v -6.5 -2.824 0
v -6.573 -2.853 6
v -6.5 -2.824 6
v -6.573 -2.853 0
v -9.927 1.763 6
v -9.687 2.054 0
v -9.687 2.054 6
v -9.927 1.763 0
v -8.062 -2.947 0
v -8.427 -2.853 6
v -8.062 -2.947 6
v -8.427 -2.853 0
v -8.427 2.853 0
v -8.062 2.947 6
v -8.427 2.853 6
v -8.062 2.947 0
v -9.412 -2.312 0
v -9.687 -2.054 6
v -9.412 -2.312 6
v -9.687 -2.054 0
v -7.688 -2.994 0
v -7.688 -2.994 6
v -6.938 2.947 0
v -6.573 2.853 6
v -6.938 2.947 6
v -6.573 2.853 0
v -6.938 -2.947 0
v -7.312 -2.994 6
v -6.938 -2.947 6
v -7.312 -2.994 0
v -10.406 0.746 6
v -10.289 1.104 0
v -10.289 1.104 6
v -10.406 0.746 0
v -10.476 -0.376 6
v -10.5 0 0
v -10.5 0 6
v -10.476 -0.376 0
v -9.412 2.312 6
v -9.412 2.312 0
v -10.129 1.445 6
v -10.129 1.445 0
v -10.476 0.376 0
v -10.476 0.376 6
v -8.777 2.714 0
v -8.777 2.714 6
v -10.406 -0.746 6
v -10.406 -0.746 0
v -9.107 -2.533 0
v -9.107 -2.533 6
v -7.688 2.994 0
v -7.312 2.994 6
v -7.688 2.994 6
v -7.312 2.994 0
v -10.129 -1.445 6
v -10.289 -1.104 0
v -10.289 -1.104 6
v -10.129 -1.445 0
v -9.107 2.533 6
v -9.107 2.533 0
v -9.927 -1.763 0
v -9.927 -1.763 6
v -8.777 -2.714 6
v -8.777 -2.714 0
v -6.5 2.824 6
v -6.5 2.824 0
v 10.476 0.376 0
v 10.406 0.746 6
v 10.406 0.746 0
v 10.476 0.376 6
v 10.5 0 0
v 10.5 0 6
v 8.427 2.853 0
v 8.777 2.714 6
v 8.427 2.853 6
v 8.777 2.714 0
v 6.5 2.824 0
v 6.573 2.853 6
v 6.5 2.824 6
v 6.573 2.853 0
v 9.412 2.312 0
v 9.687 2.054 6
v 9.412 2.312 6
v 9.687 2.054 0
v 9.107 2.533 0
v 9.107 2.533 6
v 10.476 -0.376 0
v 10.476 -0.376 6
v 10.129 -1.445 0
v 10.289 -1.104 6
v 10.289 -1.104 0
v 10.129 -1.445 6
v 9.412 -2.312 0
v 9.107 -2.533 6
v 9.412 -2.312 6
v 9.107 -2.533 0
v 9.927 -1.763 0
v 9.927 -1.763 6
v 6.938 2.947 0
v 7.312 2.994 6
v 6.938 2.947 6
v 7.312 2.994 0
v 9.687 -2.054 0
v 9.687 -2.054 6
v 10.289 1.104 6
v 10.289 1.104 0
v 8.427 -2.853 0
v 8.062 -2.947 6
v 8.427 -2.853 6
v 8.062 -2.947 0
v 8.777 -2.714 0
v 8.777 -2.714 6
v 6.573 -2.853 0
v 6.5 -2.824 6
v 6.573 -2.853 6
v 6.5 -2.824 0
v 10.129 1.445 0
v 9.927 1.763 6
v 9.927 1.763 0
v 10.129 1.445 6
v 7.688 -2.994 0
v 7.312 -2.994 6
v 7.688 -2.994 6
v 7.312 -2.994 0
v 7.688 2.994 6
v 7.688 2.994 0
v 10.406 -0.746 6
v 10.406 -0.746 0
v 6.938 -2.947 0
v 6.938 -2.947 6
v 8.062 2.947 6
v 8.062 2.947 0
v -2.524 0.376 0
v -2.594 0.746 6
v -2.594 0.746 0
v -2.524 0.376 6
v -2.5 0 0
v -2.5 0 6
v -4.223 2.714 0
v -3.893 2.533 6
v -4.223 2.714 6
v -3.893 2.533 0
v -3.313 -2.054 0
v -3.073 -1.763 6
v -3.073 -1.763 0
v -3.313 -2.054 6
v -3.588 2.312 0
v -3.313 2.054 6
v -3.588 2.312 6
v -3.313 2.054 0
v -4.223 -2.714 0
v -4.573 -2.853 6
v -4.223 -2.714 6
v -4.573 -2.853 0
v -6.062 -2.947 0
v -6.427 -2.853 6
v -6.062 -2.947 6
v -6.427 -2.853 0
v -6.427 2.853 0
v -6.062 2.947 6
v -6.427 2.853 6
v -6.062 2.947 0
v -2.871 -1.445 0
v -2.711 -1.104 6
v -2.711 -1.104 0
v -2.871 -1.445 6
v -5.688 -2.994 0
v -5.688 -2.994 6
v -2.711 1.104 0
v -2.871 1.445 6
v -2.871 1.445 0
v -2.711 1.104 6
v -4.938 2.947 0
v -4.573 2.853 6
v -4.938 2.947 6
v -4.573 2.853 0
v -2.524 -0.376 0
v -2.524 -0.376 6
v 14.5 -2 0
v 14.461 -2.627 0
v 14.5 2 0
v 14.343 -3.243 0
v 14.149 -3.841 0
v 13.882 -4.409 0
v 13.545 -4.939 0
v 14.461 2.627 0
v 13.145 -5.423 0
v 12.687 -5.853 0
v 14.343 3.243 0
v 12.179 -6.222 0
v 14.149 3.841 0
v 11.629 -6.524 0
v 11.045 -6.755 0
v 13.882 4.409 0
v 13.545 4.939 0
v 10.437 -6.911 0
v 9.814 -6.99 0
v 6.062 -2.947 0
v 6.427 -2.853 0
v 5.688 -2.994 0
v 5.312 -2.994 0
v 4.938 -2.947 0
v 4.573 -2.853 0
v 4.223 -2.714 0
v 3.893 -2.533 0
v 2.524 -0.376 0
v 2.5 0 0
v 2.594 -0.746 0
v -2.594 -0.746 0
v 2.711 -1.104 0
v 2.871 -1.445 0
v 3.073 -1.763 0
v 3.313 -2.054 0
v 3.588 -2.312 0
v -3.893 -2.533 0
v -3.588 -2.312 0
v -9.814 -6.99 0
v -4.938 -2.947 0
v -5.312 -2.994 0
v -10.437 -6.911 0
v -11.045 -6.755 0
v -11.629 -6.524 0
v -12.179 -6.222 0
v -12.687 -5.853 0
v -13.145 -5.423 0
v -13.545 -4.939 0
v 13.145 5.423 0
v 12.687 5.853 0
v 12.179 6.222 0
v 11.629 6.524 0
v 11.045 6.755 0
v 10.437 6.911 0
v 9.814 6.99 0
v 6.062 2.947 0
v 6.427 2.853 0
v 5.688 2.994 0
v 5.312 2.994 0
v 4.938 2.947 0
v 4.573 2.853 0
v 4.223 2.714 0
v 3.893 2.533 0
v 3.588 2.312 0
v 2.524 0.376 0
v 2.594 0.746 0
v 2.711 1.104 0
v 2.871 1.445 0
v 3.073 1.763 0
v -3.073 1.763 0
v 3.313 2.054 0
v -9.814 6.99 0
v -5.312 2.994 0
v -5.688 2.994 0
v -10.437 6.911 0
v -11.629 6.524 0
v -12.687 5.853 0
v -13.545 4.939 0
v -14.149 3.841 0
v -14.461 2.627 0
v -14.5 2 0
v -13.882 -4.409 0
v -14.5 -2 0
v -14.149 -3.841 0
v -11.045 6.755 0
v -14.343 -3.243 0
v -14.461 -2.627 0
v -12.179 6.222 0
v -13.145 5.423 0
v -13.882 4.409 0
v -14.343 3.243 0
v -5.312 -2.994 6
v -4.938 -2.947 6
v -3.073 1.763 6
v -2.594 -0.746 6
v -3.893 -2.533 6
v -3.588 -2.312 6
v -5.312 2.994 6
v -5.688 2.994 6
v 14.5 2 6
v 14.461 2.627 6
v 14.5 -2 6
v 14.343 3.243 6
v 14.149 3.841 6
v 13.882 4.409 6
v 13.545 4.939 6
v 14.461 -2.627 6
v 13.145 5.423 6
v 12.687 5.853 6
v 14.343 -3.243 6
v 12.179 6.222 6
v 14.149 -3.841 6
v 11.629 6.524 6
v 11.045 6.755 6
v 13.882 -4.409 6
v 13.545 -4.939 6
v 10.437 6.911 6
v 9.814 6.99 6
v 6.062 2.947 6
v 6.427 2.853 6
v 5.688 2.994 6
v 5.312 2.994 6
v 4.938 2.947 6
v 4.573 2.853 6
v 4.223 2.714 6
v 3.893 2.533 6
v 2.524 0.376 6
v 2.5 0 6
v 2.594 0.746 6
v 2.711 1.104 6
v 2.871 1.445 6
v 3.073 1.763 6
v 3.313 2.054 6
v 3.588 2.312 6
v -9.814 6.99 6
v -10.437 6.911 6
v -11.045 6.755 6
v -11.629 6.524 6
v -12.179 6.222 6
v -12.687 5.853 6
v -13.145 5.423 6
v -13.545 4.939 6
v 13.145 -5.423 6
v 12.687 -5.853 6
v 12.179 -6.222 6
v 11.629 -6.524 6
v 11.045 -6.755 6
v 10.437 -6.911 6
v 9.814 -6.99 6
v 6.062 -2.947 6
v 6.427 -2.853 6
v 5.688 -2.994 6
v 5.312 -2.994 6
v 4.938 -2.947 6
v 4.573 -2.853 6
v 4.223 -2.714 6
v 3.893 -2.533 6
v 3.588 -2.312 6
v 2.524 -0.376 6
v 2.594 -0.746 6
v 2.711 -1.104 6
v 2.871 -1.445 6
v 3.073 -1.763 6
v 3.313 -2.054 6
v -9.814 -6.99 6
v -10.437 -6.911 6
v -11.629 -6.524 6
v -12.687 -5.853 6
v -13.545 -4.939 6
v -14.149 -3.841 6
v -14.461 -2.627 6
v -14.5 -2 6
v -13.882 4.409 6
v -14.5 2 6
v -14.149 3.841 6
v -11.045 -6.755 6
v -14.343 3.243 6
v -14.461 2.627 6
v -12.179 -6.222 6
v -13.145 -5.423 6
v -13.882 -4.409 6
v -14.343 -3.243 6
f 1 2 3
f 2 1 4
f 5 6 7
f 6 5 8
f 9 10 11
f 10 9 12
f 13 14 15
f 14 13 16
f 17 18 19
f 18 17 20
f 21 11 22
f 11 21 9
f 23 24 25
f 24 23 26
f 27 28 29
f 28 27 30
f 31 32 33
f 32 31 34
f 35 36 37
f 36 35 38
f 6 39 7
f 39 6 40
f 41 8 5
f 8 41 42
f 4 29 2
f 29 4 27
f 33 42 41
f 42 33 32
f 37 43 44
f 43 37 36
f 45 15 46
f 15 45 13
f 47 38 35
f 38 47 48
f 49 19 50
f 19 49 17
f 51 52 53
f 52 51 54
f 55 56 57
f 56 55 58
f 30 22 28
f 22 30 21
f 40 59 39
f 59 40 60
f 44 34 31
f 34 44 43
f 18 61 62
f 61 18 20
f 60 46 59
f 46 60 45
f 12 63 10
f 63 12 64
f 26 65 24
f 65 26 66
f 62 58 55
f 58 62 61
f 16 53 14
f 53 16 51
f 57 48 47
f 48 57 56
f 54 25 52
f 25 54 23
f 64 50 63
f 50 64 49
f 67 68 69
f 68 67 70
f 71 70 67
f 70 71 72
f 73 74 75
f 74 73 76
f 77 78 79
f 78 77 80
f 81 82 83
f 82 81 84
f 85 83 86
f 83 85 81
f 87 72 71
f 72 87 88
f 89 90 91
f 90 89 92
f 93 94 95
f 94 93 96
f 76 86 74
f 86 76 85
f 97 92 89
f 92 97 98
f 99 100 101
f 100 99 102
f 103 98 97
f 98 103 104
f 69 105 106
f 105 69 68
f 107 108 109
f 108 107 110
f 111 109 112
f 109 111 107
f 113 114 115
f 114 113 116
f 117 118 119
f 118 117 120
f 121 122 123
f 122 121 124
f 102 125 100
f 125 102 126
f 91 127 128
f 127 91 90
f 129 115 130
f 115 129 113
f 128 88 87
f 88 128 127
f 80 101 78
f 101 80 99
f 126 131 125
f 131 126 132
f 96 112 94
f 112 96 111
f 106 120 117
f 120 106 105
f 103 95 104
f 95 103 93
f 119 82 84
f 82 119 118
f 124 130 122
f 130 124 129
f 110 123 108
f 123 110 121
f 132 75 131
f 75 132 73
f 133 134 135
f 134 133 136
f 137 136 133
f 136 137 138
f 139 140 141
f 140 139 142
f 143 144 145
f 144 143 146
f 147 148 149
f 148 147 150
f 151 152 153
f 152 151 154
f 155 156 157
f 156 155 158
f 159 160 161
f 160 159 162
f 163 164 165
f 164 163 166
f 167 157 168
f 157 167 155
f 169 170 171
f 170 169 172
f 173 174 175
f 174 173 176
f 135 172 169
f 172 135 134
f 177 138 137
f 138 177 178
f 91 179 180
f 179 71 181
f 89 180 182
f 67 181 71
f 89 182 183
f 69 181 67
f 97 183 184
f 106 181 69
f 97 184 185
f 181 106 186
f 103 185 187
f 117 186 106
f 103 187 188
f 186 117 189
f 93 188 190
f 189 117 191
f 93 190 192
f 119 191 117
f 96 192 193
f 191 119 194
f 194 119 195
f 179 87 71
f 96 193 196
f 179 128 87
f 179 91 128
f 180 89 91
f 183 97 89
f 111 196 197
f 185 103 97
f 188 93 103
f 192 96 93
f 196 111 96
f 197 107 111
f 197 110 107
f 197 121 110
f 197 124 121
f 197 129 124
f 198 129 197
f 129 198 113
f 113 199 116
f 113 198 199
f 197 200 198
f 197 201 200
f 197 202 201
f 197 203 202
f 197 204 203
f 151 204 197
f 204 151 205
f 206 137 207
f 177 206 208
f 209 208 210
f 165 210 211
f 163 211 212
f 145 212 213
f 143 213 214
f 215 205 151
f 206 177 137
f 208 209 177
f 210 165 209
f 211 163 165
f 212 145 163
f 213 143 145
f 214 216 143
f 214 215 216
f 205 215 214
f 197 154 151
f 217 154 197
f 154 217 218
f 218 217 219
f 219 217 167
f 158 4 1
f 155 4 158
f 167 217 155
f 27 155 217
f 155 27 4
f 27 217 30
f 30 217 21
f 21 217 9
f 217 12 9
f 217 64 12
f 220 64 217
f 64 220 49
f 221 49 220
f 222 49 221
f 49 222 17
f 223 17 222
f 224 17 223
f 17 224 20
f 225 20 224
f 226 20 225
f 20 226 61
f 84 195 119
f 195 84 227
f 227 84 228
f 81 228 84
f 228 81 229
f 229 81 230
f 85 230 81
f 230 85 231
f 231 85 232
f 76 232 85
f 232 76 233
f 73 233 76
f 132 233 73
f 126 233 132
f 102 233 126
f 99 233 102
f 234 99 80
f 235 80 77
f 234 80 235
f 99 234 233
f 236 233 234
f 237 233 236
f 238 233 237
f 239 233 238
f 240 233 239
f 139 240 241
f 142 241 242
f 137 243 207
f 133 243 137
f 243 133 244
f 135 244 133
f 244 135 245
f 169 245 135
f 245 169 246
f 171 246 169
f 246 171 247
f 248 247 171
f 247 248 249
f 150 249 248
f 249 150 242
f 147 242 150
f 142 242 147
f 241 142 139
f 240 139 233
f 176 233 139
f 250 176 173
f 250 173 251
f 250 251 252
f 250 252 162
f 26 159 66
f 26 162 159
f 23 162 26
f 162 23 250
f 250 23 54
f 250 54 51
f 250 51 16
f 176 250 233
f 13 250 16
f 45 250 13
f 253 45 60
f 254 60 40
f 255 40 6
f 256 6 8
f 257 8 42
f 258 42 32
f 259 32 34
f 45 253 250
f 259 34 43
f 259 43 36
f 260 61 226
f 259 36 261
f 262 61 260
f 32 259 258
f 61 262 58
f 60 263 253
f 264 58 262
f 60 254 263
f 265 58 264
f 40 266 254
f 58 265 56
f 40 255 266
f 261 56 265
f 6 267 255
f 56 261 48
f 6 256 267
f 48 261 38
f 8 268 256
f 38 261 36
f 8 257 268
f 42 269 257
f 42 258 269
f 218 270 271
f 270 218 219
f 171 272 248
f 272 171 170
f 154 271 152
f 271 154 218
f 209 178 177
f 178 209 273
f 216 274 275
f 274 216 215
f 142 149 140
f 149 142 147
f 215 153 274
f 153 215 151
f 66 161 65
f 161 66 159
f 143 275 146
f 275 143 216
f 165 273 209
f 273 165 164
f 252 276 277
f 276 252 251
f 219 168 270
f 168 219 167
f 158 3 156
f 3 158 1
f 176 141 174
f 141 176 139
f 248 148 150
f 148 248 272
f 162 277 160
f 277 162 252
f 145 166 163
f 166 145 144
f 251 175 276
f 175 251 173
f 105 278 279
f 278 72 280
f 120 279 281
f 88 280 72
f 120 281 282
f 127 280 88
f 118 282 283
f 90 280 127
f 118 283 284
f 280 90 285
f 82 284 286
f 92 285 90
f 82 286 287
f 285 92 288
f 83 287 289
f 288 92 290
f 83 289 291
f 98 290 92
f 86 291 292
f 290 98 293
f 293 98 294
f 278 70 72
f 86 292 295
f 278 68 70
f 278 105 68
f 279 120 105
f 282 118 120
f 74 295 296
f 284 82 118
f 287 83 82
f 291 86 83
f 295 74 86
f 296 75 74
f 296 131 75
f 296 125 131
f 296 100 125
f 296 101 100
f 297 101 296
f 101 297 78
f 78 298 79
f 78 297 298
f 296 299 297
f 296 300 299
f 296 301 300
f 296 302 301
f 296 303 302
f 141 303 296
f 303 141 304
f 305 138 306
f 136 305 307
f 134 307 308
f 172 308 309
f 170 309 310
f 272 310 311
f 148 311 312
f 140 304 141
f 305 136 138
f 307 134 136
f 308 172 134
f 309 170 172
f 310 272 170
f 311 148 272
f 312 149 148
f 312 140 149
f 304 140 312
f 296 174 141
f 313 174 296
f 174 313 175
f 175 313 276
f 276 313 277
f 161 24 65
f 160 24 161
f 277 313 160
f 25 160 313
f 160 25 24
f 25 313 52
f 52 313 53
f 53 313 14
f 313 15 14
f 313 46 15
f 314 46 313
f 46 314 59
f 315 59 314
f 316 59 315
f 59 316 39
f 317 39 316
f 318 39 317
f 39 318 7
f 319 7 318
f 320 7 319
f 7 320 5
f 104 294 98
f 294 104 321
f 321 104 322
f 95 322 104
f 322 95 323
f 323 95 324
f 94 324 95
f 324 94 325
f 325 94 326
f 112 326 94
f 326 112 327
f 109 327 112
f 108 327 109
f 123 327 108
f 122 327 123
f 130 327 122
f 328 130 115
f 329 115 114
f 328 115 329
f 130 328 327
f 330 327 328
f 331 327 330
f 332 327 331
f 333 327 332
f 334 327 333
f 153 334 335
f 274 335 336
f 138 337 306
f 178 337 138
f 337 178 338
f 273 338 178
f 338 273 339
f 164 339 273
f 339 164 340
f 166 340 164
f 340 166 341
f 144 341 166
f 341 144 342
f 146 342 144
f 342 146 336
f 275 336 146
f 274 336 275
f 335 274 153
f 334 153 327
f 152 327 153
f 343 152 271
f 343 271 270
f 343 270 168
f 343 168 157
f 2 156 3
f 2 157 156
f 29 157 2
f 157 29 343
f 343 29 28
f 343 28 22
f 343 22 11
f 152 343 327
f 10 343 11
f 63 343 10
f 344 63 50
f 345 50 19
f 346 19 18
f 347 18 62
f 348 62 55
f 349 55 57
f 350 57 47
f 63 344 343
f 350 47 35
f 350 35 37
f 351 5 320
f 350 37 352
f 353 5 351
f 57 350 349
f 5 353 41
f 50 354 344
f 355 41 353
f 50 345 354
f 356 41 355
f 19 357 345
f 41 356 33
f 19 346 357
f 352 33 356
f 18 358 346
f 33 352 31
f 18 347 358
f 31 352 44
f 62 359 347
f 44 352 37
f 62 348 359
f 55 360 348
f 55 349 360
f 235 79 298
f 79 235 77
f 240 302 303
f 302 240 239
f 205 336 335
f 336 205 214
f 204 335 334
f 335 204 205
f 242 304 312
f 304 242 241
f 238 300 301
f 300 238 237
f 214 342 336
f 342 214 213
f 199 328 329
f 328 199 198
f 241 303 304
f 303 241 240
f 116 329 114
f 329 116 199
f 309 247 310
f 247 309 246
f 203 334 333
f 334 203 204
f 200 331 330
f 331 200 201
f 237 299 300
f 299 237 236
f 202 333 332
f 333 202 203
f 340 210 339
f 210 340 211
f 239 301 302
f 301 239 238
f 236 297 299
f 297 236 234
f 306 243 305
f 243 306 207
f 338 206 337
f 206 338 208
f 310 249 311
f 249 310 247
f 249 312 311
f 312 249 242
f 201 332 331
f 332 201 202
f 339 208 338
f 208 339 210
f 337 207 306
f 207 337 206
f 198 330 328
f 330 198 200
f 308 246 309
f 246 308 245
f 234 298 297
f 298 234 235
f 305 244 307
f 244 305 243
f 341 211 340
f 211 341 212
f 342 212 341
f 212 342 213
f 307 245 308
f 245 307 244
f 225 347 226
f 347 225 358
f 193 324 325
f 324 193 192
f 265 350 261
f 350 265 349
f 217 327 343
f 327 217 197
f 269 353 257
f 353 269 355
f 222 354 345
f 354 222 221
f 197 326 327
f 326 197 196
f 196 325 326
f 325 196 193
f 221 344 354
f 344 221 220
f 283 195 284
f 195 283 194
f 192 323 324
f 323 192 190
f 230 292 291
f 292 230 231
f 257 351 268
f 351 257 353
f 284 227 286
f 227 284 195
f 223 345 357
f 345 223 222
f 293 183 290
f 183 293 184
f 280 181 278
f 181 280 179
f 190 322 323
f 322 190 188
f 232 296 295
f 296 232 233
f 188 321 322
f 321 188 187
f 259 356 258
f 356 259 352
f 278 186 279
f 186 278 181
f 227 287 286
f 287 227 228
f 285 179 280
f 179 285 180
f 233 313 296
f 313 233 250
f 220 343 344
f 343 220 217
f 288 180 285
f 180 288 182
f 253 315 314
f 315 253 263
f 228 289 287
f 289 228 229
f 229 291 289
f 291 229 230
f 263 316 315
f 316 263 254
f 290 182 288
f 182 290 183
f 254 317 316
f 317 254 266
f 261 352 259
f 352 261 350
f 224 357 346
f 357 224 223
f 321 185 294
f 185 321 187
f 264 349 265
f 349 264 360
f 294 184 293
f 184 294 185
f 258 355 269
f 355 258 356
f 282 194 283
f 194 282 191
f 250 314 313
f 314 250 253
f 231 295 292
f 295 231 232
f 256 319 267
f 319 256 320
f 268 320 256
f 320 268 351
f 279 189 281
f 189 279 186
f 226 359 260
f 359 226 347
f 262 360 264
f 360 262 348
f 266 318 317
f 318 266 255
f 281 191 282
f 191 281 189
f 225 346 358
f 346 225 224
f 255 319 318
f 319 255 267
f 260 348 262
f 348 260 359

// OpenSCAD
$fn = 50;


difference() {
	union() {
		hull() {
			translate(v = [-9.5000000000, 2.0000000000, 0]) {
				cylinder(h = 6, r = 5);
			}
			translate(v = [9.5000000000, 2.0000000000, 0]) {
				cylinder(h = 6, r = 5);
			}
			translate(v = [-9.5000000000, -2.0000000000, 0]) {
				cylinder(h = 6, r = 5);
			}
			translate(v = [9.5000000000, -2.0000000000, 0]) {
				cylinder(h = 6, r = 5);
			}
		}
	}
	union() {
		#translate(v = [-7.5000000000, 0.0000000000, -100.0000000000]) {
			cylinder(h = 200, r = 3.0000000000);
		}
		#translate(v = [-7.5000000000, 0.0000000000, -100.0000000000]) {
			cylinder(h = 200, r = 3.0000000000);
		}
		#translate(v = [7.5000000000, 0.0000000000, -100.0000000000]) {
			cylinder(h = 200, r = 3.0000000000);
		}
		#translate(v = [7.5000000000, 0.0000000000, -100.0000000000]) {
			cylinder(h = 200, r = 3.0000000000);
		}
		#translate(v = [-5.5000000000, 0, 0]) {
			cylinder(h = 6, r = 3.0000000000);
		}
		#translate(v = [5.5000000000, 0, 0]) {
			cylinder(h = 6, r = 3.0000000000);
		}
	}
}
